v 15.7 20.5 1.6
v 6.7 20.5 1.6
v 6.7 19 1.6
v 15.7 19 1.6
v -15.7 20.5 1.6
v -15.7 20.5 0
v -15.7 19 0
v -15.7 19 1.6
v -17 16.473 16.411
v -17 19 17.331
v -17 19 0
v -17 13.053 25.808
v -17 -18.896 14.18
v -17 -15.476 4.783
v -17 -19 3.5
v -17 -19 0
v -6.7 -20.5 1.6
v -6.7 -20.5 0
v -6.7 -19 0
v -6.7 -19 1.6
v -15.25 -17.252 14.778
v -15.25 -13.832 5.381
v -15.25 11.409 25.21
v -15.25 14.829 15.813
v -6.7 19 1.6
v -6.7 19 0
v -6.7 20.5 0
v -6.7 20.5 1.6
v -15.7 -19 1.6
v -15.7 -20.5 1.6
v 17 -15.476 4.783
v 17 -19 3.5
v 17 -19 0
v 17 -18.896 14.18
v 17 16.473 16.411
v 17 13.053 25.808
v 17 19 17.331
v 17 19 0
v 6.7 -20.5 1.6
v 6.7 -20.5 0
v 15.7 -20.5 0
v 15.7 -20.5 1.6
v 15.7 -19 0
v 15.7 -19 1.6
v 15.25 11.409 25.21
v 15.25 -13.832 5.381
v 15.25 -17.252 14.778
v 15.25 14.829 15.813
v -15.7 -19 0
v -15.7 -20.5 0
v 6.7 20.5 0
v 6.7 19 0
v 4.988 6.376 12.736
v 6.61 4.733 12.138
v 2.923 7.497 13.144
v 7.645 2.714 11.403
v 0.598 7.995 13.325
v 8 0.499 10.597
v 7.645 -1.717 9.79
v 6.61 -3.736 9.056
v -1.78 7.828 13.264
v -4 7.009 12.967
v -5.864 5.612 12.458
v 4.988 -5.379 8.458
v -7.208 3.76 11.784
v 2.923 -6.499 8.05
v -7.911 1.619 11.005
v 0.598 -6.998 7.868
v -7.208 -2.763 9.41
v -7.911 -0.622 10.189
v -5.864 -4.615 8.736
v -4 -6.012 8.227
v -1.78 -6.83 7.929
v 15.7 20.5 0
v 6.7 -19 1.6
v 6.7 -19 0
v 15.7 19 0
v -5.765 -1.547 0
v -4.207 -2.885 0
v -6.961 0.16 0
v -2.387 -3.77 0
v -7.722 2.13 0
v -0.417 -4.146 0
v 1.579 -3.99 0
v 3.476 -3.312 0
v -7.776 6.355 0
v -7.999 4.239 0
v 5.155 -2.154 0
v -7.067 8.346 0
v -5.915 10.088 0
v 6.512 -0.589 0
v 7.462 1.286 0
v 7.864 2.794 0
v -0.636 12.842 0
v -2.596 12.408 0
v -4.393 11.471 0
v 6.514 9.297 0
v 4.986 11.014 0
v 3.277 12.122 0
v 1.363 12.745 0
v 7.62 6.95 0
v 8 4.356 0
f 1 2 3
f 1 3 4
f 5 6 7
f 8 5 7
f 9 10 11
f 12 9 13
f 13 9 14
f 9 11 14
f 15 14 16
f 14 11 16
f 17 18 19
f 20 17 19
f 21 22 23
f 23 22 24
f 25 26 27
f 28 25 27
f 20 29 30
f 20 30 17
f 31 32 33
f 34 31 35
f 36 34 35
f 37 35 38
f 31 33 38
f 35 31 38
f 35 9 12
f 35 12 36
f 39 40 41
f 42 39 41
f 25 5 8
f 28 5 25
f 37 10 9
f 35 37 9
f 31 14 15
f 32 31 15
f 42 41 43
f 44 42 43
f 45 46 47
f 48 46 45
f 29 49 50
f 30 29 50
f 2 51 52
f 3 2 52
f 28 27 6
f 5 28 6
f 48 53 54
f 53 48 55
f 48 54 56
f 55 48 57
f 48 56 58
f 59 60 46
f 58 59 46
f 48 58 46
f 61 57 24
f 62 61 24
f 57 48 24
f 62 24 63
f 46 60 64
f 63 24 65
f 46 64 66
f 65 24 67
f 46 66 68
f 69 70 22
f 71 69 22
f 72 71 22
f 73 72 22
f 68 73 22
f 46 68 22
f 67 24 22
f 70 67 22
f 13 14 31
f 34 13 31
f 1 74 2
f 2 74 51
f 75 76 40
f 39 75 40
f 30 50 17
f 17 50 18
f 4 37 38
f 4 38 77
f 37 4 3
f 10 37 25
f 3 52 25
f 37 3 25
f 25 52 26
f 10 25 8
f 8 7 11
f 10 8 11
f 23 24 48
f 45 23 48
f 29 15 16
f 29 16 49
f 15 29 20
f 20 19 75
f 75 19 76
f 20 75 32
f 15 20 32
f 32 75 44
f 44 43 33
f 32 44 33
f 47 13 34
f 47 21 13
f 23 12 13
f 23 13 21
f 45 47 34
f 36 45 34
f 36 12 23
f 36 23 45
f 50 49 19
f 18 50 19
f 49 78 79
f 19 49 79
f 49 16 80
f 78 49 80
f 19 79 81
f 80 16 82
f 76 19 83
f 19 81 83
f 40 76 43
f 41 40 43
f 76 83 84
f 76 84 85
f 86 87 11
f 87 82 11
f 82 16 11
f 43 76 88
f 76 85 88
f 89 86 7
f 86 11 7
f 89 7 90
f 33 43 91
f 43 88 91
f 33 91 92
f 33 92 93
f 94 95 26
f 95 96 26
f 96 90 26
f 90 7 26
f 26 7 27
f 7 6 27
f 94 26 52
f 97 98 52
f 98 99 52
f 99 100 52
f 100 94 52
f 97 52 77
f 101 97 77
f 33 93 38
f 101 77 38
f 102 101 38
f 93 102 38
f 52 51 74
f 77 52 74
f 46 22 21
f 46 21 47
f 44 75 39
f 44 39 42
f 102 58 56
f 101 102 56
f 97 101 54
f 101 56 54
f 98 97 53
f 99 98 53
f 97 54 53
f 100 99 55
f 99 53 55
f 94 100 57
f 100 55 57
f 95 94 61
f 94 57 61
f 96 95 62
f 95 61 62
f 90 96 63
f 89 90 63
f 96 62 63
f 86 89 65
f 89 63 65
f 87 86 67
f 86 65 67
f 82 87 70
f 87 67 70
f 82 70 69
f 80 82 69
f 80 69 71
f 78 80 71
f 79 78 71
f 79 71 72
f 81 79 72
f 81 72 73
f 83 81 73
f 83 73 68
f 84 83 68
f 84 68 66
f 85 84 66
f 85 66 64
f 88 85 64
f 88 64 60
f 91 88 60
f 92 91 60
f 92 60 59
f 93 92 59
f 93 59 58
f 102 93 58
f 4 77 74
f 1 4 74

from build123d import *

# Parameters (mm, degrees)
F1_DEPTH = 1.6
F3_DEPTH = 20
F5_DEPTH = 34.001
F6_W     = 34
F6_H     = 34
F6_W_2   = 30.5
F6_H_2   = 30.5
F7_DEPTH = 10
F6_R     = 8
F8_DEPTH = 16.7997198341


# Not quite as in the source:
# - a feature names something its author has since deleted; it is built from what else it names


with BuildPart() as f1:
    # F0 (on Top) → F1 (new body)
    with BuildSketch(Plane.XY):
        Polygon((-15.7, 19), (-17, 19), (-17, -19), (-15.7, -19), (-15.7, -20.5), (-6.7, -20.5), (-6.7, -19), (6.7, -19), (6.7, -20.5), (15.7, -20.5), (15.7, -19), (17, -19), (17, 19), (15.7, 19), (15.7, 20.5), (6.7, 20.5), (6.7, 19), (-6.7, 19), (-6.7, 20.5), (-15.7, 20.5), align=None)
    extrude(amount=F1_DEPTH)

    # F2 (on face) → F3 (join)
    with BuildSketch(Plane.XY.offset(1.6)):
        Polygon((-15.7, 19), (-17, 19), (-17, -19), (-15.7, -19), (-6.7, -19), (6.7, -19), (15.7, -19), (17, -19), (17, 19), (15.7, 19), (6.7, 19), (-6.7, 19), align=None)
    extrude(amount=F3_DEPTH)

    # F4 (on face) → F5 (cut, through all)
    with BuildSketch(Plane(origin=(-17, 0, 0), x_dir=(0, -1, 0), z_dir=(-1, 0, 0))):
        Polygon((-19, 17.3308689021), (19, 3.5), (19, 21.6), (-19, 21.6), align=None)
    extrude(amount=-F5_DEPTH, mode=Mode.SUBTRACT)

    # F6 (on face) → F7 (join)
    with BuildSketch(Plane(origin=(0, -3.3474561073, 9.1970600675), x_dir=(1, 0, 0), z_dir=(0, -0.3420201433, 0.9396926208))):
        with Locations((0, 4.0929107067)):
            Rectangle(F6_W, F6_H)
        with Locations((0, 4.0929107067)):
            Rectangle(F6_W_2, F6_H_2, mode=Mode.SUBTRACT)
    extrude(amount=F7_DEPTH)

    # F6 (on face) → F8 (cut, through all)
    with BuildSketch(Plane(origin=(0, -3.3474561073, 9.1970600675), x_dir=(1, 0, 0), z_dir=(0, -0.3420201433, 0.9396926208))):
        with Locations((0, 4.0929107067)):
            Circle(F6_R)
    extrude(amount=-F8_DEPTH, mode=Mode.SUBTRACT)


solid = f1.part
